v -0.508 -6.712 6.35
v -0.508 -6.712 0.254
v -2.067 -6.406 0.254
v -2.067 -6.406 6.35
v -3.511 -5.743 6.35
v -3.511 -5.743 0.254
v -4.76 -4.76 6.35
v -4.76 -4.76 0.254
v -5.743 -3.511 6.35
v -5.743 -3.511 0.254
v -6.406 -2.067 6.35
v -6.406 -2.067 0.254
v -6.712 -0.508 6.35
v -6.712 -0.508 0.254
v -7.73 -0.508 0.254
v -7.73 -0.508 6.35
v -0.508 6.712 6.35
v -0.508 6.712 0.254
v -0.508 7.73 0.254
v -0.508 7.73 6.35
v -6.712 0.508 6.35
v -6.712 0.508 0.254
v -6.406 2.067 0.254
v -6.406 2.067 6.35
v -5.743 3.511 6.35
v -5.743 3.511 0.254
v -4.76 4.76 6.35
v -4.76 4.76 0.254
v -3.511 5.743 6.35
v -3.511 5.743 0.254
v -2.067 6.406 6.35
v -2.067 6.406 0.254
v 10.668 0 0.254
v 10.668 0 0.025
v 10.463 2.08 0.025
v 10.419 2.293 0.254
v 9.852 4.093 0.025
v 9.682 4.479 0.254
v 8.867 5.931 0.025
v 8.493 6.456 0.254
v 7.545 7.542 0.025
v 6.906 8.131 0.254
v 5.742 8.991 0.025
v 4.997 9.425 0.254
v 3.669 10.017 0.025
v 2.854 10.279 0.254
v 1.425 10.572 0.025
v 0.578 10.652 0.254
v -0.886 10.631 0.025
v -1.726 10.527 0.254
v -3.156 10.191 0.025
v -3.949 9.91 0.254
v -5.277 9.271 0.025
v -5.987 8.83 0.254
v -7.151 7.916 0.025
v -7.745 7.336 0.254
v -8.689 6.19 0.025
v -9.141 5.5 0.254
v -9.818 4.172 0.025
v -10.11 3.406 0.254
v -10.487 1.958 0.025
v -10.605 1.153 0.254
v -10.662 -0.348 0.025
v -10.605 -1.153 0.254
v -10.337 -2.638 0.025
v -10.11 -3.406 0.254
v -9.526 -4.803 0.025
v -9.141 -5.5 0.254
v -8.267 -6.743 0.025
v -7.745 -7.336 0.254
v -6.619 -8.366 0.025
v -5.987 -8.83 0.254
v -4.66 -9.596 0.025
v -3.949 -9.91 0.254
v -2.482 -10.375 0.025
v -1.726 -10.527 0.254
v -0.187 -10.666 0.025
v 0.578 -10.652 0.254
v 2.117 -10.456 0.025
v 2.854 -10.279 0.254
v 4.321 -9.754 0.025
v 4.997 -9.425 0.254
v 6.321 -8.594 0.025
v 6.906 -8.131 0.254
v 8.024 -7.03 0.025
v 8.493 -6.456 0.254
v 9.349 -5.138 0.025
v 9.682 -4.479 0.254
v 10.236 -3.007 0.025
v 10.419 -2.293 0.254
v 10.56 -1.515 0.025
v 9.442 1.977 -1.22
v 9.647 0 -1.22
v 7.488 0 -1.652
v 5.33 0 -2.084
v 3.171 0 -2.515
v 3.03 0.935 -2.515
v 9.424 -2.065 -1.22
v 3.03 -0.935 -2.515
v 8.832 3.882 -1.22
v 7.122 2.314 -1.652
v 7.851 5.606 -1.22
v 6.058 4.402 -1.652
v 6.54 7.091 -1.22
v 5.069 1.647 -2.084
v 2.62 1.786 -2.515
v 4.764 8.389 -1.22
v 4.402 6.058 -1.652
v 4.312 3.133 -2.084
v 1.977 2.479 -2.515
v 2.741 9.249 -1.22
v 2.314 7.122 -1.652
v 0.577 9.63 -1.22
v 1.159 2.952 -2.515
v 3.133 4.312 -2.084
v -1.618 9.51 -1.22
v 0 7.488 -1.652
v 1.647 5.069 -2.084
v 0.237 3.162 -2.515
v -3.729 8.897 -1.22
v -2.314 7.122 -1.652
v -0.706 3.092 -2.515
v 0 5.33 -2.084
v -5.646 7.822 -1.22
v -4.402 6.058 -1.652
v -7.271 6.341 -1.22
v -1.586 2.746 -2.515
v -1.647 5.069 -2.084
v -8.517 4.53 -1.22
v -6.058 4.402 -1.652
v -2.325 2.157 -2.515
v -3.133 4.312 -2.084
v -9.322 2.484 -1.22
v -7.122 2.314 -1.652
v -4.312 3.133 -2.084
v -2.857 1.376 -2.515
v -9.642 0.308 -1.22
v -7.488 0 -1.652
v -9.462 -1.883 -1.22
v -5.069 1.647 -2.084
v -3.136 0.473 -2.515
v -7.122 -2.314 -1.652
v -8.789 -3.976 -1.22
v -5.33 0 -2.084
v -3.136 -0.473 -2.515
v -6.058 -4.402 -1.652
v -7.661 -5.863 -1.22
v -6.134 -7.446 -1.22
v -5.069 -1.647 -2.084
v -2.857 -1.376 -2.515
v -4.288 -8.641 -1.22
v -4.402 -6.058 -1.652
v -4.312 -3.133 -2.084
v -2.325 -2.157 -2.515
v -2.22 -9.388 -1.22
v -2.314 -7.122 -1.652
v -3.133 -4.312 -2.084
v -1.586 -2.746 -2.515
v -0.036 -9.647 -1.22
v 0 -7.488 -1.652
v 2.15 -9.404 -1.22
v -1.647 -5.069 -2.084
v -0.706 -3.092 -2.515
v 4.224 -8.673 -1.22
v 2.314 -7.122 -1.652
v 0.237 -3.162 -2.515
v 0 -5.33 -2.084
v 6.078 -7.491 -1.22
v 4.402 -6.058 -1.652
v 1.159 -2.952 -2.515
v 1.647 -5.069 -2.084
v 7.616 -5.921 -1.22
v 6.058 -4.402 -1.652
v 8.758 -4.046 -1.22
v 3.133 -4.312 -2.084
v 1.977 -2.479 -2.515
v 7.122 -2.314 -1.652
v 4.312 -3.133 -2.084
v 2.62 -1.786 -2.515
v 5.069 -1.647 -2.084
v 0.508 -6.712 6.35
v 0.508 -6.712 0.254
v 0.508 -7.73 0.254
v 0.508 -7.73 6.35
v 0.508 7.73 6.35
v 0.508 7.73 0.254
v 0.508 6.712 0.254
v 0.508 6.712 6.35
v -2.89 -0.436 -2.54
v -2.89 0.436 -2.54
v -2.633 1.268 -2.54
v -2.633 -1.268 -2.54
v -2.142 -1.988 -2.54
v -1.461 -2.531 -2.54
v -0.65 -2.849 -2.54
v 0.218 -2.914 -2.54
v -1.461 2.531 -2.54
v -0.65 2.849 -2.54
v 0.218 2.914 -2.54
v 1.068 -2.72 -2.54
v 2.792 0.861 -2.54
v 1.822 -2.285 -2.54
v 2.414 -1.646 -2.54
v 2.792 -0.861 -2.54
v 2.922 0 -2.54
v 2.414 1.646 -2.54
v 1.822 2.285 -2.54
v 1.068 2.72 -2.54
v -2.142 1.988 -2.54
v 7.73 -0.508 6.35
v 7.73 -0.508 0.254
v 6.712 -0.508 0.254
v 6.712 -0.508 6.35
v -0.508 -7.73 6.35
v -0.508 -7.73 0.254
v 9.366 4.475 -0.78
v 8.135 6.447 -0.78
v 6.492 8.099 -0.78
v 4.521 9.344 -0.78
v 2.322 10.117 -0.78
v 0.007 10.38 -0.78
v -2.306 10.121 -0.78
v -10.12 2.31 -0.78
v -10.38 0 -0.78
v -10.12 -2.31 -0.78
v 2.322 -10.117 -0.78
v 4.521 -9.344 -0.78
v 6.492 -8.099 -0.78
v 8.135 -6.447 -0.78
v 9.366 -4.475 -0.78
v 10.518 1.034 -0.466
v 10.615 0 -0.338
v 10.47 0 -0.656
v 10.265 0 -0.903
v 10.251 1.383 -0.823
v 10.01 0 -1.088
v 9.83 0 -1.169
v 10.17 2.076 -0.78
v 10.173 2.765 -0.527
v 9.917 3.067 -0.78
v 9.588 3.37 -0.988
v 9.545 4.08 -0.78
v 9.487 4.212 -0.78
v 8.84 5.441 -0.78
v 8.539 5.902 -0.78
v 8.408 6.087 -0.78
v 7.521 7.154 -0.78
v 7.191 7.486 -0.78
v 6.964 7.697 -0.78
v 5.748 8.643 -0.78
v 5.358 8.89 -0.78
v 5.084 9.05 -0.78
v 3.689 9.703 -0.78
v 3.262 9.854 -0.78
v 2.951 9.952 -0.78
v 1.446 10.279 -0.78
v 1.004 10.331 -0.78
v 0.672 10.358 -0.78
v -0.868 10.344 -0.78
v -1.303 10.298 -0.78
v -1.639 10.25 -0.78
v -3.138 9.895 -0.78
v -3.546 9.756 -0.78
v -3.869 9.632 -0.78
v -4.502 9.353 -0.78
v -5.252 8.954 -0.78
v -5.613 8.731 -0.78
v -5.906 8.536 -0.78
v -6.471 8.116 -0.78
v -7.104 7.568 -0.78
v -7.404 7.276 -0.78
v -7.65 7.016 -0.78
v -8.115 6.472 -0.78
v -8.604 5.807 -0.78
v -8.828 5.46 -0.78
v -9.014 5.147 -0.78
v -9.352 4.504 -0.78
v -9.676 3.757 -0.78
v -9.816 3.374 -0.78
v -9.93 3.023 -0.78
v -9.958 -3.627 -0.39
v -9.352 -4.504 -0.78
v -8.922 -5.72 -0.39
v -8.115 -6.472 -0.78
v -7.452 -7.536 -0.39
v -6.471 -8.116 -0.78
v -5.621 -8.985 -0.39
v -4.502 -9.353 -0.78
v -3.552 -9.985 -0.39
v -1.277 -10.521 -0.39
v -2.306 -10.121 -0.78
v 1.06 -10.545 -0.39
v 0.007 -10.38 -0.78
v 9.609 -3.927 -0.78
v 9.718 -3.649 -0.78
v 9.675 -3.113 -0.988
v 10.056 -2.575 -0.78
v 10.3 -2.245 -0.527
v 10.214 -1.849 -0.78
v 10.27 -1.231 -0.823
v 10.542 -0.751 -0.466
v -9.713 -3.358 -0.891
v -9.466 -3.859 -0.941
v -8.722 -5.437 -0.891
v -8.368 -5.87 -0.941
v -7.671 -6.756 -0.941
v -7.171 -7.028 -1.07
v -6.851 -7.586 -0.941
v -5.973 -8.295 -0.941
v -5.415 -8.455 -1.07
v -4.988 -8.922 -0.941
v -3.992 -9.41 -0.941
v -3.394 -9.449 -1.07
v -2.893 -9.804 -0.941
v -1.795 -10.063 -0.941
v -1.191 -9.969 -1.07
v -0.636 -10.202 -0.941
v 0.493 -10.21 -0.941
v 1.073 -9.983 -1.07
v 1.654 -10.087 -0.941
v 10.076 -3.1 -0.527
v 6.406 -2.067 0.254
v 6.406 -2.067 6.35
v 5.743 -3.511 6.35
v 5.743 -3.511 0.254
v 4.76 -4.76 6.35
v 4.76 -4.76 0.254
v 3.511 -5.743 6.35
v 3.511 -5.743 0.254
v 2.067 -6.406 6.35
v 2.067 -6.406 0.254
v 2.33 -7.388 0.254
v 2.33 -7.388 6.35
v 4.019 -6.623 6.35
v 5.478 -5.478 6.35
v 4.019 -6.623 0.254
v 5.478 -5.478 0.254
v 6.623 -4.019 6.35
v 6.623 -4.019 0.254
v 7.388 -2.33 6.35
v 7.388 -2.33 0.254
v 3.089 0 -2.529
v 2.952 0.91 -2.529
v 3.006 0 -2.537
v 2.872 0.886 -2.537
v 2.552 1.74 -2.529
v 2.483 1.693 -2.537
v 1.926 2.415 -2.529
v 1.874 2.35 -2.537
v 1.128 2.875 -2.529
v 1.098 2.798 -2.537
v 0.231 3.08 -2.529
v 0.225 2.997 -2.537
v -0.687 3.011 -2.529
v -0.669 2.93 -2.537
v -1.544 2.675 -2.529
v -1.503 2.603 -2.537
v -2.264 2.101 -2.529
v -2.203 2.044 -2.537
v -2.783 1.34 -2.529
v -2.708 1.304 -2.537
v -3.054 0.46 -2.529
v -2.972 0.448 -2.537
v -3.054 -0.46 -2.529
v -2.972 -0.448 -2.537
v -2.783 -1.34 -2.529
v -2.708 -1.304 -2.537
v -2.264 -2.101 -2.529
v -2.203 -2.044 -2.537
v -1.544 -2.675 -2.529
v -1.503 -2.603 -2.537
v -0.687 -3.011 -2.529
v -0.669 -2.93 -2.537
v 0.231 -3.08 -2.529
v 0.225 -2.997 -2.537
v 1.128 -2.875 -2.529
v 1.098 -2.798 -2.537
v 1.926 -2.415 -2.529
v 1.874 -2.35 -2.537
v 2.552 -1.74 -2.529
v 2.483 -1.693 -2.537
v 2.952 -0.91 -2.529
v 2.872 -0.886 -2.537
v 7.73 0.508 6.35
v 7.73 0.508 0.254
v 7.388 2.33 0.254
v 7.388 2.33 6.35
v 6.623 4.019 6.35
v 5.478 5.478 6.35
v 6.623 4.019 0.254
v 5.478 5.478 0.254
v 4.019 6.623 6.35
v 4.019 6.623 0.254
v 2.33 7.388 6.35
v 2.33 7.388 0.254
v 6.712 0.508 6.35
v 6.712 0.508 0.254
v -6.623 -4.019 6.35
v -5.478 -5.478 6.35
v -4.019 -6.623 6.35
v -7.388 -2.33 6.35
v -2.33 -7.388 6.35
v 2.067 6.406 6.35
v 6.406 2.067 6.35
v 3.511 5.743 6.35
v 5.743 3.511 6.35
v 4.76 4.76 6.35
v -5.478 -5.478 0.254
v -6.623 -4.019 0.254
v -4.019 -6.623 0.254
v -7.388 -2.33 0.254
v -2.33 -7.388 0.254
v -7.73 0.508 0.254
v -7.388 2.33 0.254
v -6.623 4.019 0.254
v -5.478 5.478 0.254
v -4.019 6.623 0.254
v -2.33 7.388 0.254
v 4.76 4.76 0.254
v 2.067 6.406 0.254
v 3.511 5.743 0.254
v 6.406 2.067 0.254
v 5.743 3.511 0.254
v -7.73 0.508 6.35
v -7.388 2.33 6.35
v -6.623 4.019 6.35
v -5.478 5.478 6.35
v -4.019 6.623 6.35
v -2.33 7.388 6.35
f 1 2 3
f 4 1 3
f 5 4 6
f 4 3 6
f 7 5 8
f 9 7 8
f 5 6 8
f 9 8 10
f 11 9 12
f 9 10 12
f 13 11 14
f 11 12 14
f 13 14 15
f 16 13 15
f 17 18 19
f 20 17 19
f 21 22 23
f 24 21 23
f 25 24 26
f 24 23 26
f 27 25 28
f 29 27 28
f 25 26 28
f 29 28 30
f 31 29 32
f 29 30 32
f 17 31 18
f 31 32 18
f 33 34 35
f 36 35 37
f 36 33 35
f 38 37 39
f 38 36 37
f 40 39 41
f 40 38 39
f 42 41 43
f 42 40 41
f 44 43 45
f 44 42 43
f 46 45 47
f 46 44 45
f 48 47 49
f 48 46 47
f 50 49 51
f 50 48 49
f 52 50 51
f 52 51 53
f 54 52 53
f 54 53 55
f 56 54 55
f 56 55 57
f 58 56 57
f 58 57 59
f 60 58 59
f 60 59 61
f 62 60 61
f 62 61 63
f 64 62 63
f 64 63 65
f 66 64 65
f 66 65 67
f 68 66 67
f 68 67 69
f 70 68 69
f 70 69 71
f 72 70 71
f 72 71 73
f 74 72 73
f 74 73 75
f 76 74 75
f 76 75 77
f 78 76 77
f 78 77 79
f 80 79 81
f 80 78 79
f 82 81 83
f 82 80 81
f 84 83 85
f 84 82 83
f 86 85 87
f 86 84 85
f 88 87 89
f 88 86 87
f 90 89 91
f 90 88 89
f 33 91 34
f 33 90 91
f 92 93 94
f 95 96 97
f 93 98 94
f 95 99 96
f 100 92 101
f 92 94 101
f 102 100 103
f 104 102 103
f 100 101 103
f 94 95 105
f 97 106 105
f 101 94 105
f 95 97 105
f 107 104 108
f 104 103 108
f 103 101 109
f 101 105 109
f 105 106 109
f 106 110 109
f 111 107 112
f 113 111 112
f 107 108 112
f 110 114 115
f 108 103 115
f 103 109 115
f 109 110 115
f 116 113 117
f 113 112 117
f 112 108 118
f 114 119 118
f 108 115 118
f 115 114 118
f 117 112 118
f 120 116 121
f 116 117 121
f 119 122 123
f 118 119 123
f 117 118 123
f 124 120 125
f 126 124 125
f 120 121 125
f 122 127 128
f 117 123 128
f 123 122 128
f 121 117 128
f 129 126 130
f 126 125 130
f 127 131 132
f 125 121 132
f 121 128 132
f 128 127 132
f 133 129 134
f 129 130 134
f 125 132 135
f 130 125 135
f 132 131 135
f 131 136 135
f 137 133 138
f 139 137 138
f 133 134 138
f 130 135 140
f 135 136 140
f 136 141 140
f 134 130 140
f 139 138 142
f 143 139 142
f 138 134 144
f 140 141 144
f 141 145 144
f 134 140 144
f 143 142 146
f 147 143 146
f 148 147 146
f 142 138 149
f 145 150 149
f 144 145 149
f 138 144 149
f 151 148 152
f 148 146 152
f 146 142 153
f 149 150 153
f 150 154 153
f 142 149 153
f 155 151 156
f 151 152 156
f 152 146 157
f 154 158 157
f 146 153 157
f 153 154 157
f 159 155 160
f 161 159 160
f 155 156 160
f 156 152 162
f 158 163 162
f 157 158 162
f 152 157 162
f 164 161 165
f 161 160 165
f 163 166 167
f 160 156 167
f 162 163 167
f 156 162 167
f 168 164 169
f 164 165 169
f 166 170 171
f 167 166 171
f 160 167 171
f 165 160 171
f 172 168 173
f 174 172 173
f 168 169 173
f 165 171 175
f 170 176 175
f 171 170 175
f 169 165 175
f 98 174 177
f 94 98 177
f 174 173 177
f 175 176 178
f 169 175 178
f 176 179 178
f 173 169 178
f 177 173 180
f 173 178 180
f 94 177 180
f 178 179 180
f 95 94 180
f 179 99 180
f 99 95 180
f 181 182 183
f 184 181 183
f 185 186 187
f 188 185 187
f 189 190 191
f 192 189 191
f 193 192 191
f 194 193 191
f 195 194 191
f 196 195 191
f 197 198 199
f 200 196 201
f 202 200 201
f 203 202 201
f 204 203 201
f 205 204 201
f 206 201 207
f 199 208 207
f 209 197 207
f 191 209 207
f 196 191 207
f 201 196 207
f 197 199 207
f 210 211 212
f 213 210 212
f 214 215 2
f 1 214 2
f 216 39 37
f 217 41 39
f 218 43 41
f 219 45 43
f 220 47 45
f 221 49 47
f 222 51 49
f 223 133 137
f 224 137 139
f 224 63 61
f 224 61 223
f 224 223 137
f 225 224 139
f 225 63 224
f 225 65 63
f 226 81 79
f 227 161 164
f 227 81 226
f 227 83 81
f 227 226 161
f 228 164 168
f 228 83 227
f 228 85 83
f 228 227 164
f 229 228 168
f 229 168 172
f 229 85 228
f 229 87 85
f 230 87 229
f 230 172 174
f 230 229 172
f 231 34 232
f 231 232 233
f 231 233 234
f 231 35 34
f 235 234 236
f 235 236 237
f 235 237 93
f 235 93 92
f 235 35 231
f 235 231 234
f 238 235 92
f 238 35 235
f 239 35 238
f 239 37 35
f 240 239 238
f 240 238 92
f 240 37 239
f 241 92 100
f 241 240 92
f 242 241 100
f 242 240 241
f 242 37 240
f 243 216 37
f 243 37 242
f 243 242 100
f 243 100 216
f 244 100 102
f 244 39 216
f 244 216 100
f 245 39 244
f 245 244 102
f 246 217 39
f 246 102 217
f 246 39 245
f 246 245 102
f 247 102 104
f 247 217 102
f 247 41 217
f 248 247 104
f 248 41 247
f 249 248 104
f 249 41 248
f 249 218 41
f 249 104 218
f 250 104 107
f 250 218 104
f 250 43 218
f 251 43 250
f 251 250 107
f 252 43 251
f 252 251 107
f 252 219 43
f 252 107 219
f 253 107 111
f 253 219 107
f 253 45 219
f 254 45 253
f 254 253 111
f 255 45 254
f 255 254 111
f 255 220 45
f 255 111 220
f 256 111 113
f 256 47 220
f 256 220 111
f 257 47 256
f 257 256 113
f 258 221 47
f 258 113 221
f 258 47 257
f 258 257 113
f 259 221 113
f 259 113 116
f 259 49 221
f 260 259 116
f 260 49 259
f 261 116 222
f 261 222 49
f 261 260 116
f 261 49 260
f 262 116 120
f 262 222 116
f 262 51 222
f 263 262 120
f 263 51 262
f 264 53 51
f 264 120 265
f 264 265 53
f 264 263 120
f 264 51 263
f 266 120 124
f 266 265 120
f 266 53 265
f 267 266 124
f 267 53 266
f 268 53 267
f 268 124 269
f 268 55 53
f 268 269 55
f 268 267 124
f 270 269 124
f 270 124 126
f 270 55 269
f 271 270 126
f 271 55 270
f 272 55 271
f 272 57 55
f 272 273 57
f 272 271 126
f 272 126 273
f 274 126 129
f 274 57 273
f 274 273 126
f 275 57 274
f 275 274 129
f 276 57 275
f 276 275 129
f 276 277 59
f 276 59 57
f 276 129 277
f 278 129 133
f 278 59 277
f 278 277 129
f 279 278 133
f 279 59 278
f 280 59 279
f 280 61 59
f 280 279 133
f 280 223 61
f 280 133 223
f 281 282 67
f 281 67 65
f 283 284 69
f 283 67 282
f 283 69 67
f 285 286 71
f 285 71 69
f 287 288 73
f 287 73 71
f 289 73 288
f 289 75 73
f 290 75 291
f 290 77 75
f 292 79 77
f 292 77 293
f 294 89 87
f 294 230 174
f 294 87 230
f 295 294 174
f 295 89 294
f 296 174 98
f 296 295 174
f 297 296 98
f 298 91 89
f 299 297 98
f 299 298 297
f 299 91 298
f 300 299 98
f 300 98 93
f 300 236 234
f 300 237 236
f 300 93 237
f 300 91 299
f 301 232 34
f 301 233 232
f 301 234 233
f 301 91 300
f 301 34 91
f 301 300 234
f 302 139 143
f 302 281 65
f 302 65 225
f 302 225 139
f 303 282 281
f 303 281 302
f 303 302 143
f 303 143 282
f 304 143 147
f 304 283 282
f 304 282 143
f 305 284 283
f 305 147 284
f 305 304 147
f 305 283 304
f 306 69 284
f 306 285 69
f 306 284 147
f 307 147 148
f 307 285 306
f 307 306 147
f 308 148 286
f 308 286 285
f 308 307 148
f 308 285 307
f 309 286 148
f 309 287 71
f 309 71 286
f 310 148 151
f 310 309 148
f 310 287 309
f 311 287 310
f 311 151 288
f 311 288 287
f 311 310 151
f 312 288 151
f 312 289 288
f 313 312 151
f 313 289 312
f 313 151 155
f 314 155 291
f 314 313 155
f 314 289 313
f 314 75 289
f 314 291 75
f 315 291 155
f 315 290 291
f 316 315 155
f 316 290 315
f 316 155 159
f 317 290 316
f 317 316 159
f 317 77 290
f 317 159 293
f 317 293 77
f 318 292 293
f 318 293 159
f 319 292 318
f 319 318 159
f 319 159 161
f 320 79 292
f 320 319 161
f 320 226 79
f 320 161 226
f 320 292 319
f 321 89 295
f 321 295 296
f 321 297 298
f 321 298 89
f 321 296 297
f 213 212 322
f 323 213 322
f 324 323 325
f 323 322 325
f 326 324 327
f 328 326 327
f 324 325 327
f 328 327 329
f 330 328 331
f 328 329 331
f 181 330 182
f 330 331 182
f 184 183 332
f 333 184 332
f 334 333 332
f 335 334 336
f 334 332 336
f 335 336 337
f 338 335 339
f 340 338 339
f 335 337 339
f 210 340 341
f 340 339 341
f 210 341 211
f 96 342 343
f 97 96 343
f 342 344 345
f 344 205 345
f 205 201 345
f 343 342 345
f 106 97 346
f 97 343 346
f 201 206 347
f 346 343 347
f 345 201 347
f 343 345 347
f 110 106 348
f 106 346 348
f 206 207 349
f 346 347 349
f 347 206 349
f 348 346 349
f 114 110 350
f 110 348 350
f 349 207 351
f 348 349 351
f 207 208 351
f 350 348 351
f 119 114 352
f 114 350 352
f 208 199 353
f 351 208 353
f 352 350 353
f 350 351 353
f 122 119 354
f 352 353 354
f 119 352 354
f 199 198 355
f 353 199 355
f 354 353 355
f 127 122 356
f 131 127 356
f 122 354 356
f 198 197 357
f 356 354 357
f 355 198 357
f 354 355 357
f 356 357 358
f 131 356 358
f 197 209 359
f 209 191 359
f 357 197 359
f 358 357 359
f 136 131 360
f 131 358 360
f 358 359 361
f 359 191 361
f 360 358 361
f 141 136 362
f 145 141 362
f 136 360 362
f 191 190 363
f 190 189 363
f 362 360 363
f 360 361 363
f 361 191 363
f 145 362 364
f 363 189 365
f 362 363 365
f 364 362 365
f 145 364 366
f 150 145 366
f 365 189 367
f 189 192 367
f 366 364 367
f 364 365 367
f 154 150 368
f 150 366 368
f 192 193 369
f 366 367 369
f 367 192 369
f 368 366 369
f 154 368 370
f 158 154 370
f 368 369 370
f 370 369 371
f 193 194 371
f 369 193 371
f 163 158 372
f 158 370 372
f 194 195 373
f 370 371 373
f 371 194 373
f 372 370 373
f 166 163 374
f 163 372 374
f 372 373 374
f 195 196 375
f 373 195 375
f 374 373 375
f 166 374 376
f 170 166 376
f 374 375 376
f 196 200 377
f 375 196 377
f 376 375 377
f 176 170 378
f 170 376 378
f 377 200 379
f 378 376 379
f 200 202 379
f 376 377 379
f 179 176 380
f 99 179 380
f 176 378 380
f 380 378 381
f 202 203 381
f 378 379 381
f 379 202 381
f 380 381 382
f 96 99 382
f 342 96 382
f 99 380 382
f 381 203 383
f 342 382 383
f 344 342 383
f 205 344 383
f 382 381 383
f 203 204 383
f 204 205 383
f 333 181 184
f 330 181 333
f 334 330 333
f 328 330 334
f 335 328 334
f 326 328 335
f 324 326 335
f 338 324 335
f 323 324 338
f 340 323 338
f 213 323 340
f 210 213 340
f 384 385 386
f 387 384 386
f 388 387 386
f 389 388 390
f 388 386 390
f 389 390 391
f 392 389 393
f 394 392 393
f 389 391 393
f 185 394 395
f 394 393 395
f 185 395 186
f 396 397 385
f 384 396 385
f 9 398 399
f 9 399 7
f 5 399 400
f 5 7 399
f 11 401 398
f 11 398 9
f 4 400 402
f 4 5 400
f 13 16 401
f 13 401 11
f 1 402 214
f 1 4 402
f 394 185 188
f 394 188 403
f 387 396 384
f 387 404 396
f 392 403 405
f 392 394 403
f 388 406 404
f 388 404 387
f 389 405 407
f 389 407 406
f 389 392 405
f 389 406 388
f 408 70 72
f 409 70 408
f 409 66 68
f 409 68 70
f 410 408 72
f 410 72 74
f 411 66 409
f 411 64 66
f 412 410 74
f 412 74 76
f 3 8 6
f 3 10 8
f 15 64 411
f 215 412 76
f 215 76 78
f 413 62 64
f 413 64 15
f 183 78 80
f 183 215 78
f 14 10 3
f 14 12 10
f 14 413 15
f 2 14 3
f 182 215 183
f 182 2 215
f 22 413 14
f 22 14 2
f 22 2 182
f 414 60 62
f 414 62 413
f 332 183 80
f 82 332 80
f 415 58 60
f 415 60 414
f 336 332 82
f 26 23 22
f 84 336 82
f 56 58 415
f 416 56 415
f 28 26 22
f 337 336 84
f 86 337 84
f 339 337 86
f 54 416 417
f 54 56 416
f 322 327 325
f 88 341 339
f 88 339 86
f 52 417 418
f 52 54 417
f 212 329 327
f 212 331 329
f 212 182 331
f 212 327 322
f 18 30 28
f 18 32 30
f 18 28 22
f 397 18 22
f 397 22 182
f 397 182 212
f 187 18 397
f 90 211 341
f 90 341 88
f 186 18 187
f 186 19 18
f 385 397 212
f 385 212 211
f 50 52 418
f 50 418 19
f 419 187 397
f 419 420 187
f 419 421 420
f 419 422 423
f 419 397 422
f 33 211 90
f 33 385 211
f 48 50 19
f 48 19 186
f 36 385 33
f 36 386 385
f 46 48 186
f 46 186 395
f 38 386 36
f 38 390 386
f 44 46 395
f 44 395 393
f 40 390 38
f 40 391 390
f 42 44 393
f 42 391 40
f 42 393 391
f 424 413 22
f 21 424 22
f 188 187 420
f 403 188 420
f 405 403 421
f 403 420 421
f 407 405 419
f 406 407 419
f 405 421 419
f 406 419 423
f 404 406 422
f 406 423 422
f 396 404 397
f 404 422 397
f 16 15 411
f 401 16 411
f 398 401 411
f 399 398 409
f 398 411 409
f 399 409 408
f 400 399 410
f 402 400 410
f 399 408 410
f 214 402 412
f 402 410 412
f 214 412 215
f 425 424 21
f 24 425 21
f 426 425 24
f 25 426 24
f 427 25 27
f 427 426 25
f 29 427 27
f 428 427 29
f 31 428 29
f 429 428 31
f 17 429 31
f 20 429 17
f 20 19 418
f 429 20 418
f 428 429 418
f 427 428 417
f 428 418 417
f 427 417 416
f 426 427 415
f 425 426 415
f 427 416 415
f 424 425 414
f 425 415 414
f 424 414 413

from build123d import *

# Parameters (mm, degrees)
F1_DEPTH = 6.35
F2_R     = 10.668
F3_DEPTH = 2.54
F4_DEPTH = 0.254
F6_SIZE2 = 7.62
F6_SIZE  = 1.524
F7_R     = 1.27


with BuildPart() as f1:
    # F0 (on Top) → F1 (new body)
    with BuildSketch(Plane.XY):
        with BuildLine():
            Line((6.711802813, 0.508), (7.7303263191, 0.508))
            ThreePointArc((7.7303263191, 0.508), (5.4779562339, 5.4779562339), (0.508, 7.7303263191))
            Line((0.508, 7.7303263191), (0.508, 6.711802813))
            ThreePointArc((0.508, 6.711802813), (4.7595357442, 4.7595357442), (6.711802813, 0.508))
        make_face()
    extrude(amount=F1_DEPTH)


with BuildPart() as f1b:
    # F0 (on Top) → F1, piece 2 (new body)
    with BuildSketch(Plane.XY):
        with BuildLine():
            ThreePointArc((-0.508, 7.7303263191), (-5.4779562339, 5.4779562339), (-7.7303263191, 0.508))
            Line((-7.7303263191, 0.508), (-6.711802813, 0.508))
            ThreePointArc((-6.711802813, 0.508), (-4.7595357442, 4.7595357442), (-0.508, 6.711802813))
            Line((-0.508, 6.711802813), (-0.508, 7.7303263191))
        make_face()
    extrude(amount=F1_DEPTH)


with BuildPart() as f1c:
    # F0 (on Top) → F1, piece 3 (new body)
    with BuildSketch(Plane.XY):
        with BuildLine():
            Line((-6.711802813, -0.508), (-7.7303263191, -0.508))
            ThreePointArc((-7.7303263191, -0.508), (-5.4779562339, -5.4779562339), (-0.508, -7.7303263191))
            Line((-0.508, -7.7303263191), (-0.508, -6.711802813))
            ThreePointArc((-0.508, -6.711802813), (-4.7595357442, -4.7595357442), (-6.711802813, -0.508))
        make_face()
    extrude(amount=F1_DEPTH)


with BuildPart() as f1d:
    # F0 (on Top) → F1, piece 4 (new body)
    with BuildSketch(Plane.XY):
        with BuildLine():
            ThreePointArc((0.508, -7.7303263191), (5.4779562339, -5.4779562339), (7.7303263191, -0.508))
            Line((7.7303263191, -0.508), (6.711802813, -0.508))
            ThreePointArc((6.711802813, -0.508), (4.7595357442, -4.7595357442), (0.508, -6.711802813))
            Line((0.508, -6.711802813), (0.508, -7.7303263191))
        make_face()
    extrude(amount=F1_DEPTH)


with BuildPart() as f3:
    # F2 (on Top) → F3 (new body)
    with BuildSketch(Plane.XY):
        Circle(F2_R)
    extrude(amount=-F3_DEPTH)


with BuildPart() as f4:
    # F4 (new): a face of the model
    f4_faces = [f3.part.faces().sort_by_distance(p)[0] for p in [
        (0, 0, 0),
    ]]
    extrude(f4_faces, amount=F4_DEPTH)


with BuildPart() as f1c_1:
    add(f1c.part)

    # F5: union F1b, F1, F1d, F3, F4
    add(f1b.part)
    add(f1.part)
    add(f1d.part)
    add(f3.part)
    add(f4.part)

    # F6
    f6_edges = [f1c_1.edges().sort_by_distance(p)[0] for p in [
        (-10.668, 0, -2.54),
    ]]
    f6_side = f1c_1.faces().sort_by_distance((-10.668, 0, -1.143))[0]
    chamfer(f6_edges, length=F6_SIZE, length2=F6_SIZE2, reference=f6_side)

    # F7
    f7_edges = [f1c_1.edges().sort_by_distance(p)[0] for p in [
        (-10.668, 0, -1.016),
        (-3.048, 0, -2.54),
    ]]
    fillet(f7_edges, radius=F7_R)


solid = f1c_1.part
